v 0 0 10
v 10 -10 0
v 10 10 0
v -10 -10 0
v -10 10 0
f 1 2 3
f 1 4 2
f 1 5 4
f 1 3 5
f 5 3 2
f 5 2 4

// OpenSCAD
polyhedron(
points=[ [10,10,0],[10,-10,0],[-10,-10,0],[-10,10,0],
[0,0,10] ],
faces=[ [0,1,4],[1,2,4],[2,3,4],[3,0,4],[1,0,3],[2,1,3] ]
);
